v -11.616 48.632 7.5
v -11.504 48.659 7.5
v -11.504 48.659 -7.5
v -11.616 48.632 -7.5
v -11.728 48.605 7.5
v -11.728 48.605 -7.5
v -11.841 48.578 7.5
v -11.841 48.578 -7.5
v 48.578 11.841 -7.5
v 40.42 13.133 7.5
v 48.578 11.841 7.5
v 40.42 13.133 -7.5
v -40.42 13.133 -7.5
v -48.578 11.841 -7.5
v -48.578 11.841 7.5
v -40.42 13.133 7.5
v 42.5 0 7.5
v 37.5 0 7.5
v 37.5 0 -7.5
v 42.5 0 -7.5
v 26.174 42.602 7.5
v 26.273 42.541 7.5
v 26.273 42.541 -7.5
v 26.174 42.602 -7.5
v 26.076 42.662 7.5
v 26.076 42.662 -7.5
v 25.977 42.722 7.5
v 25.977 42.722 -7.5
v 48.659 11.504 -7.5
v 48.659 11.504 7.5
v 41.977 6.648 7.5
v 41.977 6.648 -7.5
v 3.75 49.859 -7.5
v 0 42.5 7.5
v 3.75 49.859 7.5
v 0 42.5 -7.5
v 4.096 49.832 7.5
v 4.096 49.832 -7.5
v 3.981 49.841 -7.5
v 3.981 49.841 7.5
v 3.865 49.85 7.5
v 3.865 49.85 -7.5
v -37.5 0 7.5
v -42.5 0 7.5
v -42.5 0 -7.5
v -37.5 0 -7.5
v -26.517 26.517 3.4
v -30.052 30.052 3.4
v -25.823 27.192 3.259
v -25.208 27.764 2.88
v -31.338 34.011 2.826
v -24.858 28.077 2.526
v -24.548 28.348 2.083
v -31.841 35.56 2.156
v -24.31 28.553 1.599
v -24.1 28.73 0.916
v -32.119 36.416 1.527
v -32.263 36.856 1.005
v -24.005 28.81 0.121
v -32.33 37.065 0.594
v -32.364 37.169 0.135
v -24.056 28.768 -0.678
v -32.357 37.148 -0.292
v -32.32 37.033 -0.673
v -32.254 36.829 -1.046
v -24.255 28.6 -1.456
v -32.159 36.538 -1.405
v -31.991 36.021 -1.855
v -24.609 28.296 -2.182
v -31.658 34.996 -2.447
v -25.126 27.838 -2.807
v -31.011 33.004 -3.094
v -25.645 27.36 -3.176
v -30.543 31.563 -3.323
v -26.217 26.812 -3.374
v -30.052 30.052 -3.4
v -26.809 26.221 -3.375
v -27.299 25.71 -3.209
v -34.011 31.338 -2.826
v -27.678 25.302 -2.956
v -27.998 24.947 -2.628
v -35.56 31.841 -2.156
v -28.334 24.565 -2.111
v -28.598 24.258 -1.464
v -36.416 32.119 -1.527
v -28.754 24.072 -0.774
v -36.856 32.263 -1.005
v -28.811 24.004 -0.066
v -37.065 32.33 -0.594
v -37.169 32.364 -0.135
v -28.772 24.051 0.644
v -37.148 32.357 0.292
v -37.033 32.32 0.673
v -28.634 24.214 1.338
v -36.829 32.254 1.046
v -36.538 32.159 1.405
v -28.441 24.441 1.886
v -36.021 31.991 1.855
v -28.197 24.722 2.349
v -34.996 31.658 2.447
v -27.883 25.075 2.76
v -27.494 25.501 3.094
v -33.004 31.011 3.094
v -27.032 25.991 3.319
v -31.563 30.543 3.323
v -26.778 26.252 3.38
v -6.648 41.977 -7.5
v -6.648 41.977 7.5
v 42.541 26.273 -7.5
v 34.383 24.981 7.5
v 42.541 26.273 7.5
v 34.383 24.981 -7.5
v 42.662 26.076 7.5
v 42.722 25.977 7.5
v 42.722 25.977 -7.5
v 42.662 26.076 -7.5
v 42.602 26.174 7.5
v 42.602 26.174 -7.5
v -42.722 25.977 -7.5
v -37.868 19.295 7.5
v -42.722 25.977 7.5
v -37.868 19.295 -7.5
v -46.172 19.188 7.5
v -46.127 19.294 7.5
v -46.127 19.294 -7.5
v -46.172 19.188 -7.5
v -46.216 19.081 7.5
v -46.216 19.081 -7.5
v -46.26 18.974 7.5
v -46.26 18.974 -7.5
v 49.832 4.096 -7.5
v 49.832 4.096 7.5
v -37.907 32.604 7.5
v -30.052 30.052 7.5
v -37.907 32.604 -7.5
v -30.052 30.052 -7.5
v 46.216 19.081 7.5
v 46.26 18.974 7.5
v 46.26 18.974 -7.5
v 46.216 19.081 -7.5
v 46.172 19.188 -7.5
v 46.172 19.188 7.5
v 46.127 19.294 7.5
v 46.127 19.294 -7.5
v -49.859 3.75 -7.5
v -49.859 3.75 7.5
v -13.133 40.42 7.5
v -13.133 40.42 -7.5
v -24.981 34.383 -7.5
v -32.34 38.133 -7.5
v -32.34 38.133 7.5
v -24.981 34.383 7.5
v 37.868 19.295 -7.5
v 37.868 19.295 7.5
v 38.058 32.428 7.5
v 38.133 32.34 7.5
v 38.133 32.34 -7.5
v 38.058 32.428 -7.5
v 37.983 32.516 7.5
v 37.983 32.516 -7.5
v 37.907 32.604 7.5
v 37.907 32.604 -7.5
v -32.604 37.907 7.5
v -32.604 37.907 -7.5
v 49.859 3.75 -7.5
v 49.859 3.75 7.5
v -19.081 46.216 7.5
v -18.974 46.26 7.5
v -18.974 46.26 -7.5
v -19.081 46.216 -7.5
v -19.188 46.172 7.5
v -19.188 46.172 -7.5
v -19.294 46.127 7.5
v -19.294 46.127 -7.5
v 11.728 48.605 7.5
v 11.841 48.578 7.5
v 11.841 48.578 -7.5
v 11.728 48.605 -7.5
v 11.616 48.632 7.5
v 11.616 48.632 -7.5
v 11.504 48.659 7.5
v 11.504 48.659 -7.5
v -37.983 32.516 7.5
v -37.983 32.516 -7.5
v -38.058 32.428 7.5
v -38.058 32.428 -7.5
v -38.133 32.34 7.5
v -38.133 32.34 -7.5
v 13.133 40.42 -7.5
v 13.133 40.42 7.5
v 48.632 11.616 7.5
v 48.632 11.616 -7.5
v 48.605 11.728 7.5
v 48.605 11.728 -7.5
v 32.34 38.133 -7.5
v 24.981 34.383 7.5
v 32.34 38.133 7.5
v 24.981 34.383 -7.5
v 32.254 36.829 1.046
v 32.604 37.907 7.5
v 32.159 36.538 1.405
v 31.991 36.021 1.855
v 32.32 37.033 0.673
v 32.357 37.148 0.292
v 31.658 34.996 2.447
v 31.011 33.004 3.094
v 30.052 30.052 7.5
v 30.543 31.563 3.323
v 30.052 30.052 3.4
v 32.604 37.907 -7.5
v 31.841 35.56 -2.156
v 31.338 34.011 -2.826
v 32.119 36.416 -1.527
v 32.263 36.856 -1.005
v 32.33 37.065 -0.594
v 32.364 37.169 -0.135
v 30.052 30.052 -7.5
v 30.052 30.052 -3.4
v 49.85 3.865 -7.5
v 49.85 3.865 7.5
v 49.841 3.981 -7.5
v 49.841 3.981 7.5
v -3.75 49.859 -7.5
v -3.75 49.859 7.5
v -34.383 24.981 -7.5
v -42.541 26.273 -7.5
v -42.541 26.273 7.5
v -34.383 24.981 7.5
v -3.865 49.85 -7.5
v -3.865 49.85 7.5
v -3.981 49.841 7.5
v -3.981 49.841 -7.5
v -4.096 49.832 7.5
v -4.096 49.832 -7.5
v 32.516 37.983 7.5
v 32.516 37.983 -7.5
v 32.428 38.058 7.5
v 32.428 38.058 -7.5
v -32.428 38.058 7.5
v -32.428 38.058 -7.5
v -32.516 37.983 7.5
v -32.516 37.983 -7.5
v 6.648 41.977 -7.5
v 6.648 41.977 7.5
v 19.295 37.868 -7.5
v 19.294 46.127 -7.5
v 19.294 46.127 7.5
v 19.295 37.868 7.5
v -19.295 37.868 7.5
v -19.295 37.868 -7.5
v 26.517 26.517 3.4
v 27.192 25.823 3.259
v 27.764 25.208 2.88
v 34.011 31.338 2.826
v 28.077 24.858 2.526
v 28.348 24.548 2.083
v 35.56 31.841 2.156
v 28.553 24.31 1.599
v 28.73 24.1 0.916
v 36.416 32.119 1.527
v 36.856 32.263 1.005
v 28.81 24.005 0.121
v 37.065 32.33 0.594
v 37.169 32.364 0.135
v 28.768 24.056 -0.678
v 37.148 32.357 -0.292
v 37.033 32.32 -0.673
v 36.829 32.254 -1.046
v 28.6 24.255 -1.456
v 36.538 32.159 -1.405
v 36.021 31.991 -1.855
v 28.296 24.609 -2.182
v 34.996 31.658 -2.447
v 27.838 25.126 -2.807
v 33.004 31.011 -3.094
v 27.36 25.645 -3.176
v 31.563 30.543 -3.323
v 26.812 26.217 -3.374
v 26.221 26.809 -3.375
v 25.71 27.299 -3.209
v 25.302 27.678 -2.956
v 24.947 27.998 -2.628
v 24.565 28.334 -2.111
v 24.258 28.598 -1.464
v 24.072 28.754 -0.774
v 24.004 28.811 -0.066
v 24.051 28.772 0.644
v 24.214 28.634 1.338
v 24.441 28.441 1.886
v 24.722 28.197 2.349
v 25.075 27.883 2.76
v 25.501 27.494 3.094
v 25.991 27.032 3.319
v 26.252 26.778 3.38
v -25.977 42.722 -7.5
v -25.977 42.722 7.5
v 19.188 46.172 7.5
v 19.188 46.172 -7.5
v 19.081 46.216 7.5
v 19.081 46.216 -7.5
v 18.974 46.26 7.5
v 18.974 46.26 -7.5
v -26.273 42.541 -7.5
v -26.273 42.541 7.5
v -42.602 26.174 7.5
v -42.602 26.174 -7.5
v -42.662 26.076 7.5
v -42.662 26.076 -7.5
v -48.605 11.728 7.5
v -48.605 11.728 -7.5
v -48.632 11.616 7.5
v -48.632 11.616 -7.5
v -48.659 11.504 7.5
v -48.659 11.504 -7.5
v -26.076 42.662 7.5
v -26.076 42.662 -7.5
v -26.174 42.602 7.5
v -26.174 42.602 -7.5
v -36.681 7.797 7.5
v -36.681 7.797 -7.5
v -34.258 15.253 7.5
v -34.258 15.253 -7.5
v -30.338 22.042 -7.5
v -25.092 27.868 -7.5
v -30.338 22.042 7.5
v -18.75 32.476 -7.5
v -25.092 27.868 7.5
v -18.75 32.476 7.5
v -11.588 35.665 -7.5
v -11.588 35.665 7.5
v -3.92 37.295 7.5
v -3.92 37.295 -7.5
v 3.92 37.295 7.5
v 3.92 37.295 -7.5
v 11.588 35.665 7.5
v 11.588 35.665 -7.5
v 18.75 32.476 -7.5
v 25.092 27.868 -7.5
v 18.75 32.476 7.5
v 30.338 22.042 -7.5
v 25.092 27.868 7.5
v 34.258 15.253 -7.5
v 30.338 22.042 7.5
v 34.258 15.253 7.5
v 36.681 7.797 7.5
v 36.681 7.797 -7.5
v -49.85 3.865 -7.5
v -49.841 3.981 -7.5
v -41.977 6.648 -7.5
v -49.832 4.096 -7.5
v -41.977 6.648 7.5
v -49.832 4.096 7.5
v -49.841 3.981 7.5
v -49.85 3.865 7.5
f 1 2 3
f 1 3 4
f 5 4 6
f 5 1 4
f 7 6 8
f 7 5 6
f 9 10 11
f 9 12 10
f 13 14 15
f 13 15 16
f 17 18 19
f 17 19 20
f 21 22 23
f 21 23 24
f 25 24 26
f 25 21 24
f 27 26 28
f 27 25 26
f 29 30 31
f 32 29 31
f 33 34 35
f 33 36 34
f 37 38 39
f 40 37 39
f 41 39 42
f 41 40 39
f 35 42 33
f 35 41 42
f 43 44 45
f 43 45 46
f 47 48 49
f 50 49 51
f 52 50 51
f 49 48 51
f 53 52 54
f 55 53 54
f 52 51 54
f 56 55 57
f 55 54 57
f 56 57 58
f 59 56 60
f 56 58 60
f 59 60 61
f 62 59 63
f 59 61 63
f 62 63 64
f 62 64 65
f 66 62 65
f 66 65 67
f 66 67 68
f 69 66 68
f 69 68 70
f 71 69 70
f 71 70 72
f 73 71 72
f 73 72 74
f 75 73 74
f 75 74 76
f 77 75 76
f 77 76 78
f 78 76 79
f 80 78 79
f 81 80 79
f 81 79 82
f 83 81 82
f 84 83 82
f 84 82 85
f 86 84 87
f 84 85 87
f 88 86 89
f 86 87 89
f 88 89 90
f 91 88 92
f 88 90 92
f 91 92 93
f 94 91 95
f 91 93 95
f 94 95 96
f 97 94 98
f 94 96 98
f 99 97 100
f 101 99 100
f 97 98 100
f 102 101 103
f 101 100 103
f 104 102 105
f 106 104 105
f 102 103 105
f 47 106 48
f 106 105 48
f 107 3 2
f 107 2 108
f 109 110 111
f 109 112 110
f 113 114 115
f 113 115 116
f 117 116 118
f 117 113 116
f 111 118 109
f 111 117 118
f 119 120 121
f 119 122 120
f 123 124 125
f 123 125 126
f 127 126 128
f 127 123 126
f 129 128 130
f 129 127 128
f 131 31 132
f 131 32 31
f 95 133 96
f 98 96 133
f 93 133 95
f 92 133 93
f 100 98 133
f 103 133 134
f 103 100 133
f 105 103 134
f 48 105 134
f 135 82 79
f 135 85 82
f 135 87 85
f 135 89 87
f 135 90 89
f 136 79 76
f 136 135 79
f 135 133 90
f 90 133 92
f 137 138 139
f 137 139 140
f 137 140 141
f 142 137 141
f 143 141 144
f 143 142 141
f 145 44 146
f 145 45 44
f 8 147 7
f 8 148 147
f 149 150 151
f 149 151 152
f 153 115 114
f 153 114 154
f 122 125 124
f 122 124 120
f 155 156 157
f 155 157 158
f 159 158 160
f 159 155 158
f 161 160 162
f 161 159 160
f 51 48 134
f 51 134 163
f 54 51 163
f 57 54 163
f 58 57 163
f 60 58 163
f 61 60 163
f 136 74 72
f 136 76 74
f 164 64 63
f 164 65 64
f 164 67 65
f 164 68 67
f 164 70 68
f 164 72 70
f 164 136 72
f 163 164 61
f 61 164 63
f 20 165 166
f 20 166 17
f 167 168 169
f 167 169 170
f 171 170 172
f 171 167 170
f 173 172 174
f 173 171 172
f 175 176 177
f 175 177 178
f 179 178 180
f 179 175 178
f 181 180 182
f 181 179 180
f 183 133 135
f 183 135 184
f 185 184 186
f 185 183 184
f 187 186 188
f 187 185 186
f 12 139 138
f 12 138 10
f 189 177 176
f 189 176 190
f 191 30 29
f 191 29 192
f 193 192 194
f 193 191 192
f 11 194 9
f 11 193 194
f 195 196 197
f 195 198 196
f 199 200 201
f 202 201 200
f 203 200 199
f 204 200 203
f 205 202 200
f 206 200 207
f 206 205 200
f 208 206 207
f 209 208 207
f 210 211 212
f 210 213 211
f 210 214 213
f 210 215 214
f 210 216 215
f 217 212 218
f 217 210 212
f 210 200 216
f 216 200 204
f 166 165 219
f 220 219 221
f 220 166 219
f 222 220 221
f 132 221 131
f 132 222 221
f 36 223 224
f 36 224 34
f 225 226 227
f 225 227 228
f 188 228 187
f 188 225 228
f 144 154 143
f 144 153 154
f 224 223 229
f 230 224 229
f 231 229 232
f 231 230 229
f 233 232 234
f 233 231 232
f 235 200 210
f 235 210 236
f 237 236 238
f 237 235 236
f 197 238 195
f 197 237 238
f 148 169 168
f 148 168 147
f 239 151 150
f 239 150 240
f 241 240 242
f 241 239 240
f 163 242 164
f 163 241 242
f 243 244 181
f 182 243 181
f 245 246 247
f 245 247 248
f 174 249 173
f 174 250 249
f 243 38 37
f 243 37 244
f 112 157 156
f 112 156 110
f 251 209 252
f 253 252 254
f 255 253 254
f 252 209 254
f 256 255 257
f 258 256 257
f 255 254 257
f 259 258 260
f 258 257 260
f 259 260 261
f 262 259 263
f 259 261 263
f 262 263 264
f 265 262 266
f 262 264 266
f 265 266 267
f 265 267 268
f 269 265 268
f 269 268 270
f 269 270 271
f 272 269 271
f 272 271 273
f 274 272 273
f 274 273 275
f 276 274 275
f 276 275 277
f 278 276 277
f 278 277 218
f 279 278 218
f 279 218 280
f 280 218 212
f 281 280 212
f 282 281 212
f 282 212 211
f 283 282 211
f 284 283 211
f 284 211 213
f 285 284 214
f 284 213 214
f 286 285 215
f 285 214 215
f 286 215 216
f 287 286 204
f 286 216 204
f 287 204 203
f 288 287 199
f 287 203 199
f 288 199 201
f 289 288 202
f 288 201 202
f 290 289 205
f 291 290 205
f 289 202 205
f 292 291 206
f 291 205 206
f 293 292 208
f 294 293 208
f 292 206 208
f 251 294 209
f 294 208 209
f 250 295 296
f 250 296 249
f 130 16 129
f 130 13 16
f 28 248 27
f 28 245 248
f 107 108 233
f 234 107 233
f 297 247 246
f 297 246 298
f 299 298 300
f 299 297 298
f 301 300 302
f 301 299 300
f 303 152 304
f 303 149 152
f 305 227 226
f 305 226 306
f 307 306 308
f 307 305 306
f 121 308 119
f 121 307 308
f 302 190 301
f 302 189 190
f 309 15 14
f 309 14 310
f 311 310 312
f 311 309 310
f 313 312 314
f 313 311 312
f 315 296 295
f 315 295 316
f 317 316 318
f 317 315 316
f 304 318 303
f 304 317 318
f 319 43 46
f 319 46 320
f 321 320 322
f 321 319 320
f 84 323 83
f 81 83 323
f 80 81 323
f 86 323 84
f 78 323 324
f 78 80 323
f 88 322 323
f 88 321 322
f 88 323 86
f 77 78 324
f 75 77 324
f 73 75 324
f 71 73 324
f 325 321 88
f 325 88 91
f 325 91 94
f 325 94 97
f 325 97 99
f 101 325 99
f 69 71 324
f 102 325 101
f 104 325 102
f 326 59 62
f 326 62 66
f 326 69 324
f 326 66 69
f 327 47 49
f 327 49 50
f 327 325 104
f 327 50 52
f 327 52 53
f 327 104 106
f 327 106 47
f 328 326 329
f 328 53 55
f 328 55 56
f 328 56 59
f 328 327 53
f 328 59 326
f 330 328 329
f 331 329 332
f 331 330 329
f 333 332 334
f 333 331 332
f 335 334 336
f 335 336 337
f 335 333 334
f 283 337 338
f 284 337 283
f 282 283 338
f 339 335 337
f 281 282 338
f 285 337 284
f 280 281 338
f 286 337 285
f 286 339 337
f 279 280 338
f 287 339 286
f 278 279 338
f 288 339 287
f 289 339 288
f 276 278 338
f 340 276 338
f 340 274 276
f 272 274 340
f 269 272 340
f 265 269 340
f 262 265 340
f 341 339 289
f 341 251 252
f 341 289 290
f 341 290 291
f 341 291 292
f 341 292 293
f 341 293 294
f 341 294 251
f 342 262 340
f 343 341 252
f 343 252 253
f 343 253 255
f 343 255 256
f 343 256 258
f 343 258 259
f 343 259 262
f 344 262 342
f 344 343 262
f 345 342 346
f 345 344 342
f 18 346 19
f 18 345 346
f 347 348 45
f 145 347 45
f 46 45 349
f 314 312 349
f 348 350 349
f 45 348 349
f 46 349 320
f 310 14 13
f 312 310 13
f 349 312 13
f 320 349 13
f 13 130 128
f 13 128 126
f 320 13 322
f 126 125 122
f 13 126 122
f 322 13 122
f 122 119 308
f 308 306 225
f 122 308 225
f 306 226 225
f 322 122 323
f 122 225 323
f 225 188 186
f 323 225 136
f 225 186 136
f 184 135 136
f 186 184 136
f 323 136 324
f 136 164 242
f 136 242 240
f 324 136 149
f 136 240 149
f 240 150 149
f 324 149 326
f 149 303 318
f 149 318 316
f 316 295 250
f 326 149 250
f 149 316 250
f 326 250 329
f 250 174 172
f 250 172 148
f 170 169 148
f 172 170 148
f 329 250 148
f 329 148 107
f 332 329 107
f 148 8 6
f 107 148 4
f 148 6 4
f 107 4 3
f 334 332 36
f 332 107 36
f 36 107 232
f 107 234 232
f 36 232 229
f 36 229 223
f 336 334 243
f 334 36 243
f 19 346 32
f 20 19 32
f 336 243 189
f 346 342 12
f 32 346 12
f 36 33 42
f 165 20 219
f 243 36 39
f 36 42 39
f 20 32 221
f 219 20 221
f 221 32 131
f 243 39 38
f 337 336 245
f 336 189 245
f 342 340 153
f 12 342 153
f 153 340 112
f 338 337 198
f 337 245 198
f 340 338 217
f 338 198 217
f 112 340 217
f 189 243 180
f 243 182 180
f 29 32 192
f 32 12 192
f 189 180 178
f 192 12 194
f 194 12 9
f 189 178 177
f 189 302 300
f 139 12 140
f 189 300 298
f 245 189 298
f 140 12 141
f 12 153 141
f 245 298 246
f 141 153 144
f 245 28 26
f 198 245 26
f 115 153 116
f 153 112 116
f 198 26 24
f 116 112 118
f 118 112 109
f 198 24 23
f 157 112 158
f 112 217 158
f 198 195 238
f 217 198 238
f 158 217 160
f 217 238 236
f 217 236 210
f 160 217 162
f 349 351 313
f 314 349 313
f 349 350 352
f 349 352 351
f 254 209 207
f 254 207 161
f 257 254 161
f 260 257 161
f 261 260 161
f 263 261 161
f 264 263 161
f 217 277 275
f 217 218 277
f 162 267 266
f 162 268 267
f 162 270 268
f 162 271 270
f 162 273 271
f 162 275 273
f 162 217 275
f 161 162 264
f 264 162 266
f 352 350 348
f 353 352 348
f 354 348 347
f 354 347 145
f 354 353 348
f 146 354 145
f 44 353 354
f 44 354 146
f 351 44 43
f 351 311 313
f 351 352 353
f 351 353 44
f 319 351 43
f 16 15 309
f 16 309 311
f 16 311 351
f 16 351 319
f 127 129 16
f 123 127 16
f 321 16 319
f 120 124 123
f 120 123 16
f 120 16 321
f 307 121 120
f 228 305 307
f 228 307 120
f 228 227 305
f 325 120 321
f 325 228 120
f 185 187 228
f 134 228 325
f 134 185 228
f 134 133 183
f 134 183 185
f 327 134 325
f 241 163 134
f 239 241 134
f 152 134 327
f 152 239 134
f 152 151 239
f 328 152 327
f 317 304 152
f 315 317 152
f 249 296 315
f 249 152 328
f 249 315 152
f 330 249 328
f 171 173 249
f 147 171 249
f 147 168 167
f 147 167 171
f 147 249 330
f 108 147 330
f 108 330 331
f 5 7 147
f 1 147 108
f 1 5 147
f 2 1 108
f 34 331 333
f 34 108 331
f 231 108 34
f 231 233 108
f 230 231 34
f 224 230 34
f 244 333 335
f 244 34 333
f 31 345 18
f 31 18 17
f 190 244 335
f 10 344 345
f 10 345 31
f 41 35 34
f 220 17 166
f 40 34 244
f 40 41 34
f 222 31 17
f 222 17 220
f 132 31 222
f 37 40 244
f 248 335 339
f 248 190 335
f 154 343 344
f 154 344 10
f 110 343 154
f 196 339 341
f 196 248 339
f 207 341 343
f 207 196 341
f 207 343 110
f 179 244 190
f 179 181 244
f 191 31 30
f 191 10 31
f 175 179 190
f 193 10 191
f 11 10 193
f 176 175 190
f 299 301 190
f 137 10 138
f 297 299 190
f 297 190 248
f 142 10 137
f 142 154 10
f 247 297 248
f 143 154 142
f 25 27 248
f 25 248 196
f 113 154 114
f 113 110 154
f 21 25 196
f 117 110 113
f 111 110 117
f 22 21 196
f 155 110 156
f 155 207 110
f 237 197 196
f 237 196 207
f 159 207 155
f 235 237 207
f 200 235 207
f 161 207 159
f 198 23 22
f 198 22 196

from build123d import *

# Parameters (mm, degrees)
BOSS_EXTRUDE1_DEPTH    = 7.5
CUT_EXTRUDE1_DEPTH     = 7.5
M8X1_25_TAPPED_HOLE4_D = 6.8
M8X1_25_TAPPED_HOLE5_D = 6.8


with BuildPart() as part:
    # Sketch1 → Boss-Extrude1 (new body, symmetric)
    with BuildSketch(Plane.XY):
        with BuildLine():
            Line((-50, 0), (-37.5, 0))
            ThreePointArc((-37.5, 0), (0, 37.5), (37.5, 0))
            Line((37.5, 0), (50, 0))
            ThreePointArc((50, 0), (0, 50), (-50, 0))
        make_face()
    extrude(amount=BOSS_EXTRUDE1_DEPTH, both=True)

    # Sketch2 → Cut-Extrude1 (cut, symmetric)
    with BuildSketch(Plane.XY):
        with BuildLine():
            Line((-3.75, 49.859176688), (0, 42.5))
            Line((0, 42.5), (3.75, 49.859176688))
            ThreePointArc((3.75, 49.859176688), (0, 50), (-3.75, 49.859176688))
        make_face()
        with BuildLine():
            Line((4.095862355, 49.83195673), (6.648464764, 41.976754475))
            Line((6.648464764, 41.976754475), (11.50352491, 48.658698242))
            ThreePointArc((11.50352491, 48.658698242), (7.821723252, 49.38441703), (4.095862355, 49.83195673))
        make_face()
        with BuildLine():
            Line((11.840870986, 48.577708615), (13.133222261, 40.419901943))
            Line((13.133222261, 40.419901943), (18.973794858, 46.260081157))
            ThreePointArc((18.973794858, 46.260081157), (15.450849719, 47.552825815), (11.840870986, 48.577708615))
        make_face()
        with BuildLine():
            Line((19.294318075, 46.127316094), (19.294596239, 37.867777278))
            Line((19.294596239, 37.867777278), (25.976867007, 42.722387346))
            ThreePointArc((25.976867007, 42.722387346), (22.699524987, 44.550326209), (19.294318075, 46.127316094))
        make_face()
        with BuildLine():
            Line((26.27267502, 42.541115962), (24.980873222, 34.383222261))
            Line((24.980873222, 34.383222261), (32.340302478, 38.13272657))
            ThreePointArc((32.340302478, 38.13272657), (29.389262615, 40.450849719), (26.27267502, 42.541115962))
        make_face()
        with BuildLine():
            Line((32.604111511, 37.90741237), (30.0520382, 30.0520382))
            Line((30.0520382, 30.0520382), (37.90741237, 32.604111511))
            ThreePointArc((37.90741237, 32.604111511), (35.355339059, 35.355339059), (32.604111511, 37.90741237))
        make_face()
        with BuildLine():
            Line((38.13272657, 32.340302478), (34.383222261, 24.980873222))
            Line((34.383222261, 24.980873222), (42.541115962, 26.27267502))
            ThreePointArc((42.541115962, 26.27267502), (40.450849719, 29.389262615), (38.13272657, 32.340302478))
        make_face()
        with BuildLine():
            Line((42.722387346, 25.976867007), (37.867777278, 19.294596239))
            Line((37.867777278, 19.294596239), (46.127316094, 19.294318075))
            ThreePointArc((46.127316094, 19.294318075), (44.550326209, 22.699524987), (42.722387346, 25.976867007))
        make_face()
        with BuildLine():
            Line((46.260081157, 18.973794858), (40.419901943, 13.133222261))
            Line((40.419901943, 13.133222261), (48.577708615, 11.840870986))
            ThreePointArc((48.577708615, 11.840870986), (47.552825815, 15.450849719), (46.260081157, 18.973794858))
        make_face()
        with BuildLine():
            Line((48.658698242, 11.50352491), (41.976754475, 6.648464764))
            Line((41.976754475, 6.648464764), (49.83195673, 4.095862355))
            ThreePointArc((49.83195673, 4.095862355), (49.38441703, 7.821723252), (48.658698242, 11.50352491))
        make_face()
        with BuildLine():
            Line((49.859176688, 3.75), (42.5, 0))
            Line((42.5, 0), (49.859176688, -3.75))
            ThreePointArc((49.859176688, -3.75), (50, 0), (49.859176688, 3.75))
        make_face()
        with BuildLine():
            Line((-49.859176688, -3.75), (-42.5, 0))
            Line((-42.5, 0), (-49.859176688, 3.75))
            ThreePointArc((-49.859176688, 3.75), (-50, 0), (-49.859176688, -3.75))
        make_face()
        with BuildLine():
            Line((-49.83195673, 4.095862355), (-41.976754475, 6.648464764))
            Line((-41.976754475, 6.648464764), (-48.658698242, 11.50352491))
            ThreePointArc((-48.658698242, 11.50352491), (-49.38441703, 7.821723252), (-49.83195673, 4.095862355))
        make_face()
        with BuildLine():
            Line((-48.577708615, 11.840870986), (-40.419901943, 13.133222261))
            Line((-40.419901943, 13.133222261), (-46.260081157, 18.973794858))
            ThreePointArc((-46.260081157, 18.973794858), (-47.552825815, 15.450849719), (-48.577708615, 11.840870986))
        make_face()
        with BuildLine():
            Line((-46.127316094, 19.294318075), (-37.867777278, 19.294596239))
            Line((-37.867777278, 19.294596239), (-42.722387346, 25.976867007))
            ThreePointArc((-42.722387346, 25.976867007), (-44.550326209, 22.699524987), (-46.127316094, 19.294318075))
        make_face()
        with BuildLine():
            Line((-42.541115962, 26.27267502), (-34.383222261, 24.980873222))
            Line((-34.383222261, 24.980873222), (-38.13272657, 32.340302478))
            ThreePointArc((-38.13272657, 32.340302478), (-40.450849719, 29.389262615), (-42.541115962, 26.27267502))
        make_face()
        with BuildLine():
            Line((-37.90741237, 32.604111511), (-30.0520382, 30.0520382))
            Line((-30.0520382, 30.0520382), (-32.604111511, 37.90741237))
            ThreePointArc((-32.604111511, 37.90741237), (-35.355339059, 35.355339059), (-37.90741237, 32.604111511))
        make_face()
        with BuildLine():
            Line((-32.340302478, 38.13272657), (-24.980873222, 34.383222261))
            Line((-24.980873222, 34.383222261), (-26.27267502, 42.541115962))
            ThreePointArc((-26.27267502, 42.541115962), (-29.389262615, 40.450849719), (-32.340302478, 38.13272657))
        make_face()
        with BuildLine():
            Line((-25.976867007, 42.722387346), (-19.294596239, 37.867777278))
            Line((-19.294596239, 37.867777278), (-19.294318075, 46.127316094))
            ThreePointArc((-19.294318075, 46.127316094), (-22.699524987, 44.550326209), (-25.976867007, 42.722387346))
        make_face()
        with BuildLine():
            Line((-18.973794858, 46.260081157), (-13.133222261, 40.419901943))
            Line((-13.133222261, 40.419901943), (-11.840870986, 48.577708615))
            ThreePointArc((-11.840870986, 48.577708615), (-15.450849719, 47.552825815), (-18.973794858, 46.260081157))
        make_face()
        with BuildLine():
            Line((-11.50352491, 48.658698242), (-6.648464764, 41.976754475))
            Line((-6.648464764, 41.976754475), (-4.095862355, 49.83195673))
            ThreePointArc((-4.095862355, 49.83195673), (-7.821723252, 49.38441703), (-11.50352491, 48.658698242))
        make_face()
    extrude(amount=CUT_EXTRUDE1_DEPTH, both=True, mode=Mode.SUBTRACT)

    # M8x1.25 Tapped Hole4 (through all)
    with Locations(Plane(origin=(-19.445436483, 19.445436483, 0), x_dir=(0, 0, -1), z_dir=(0.707106781, -0.707106781, 0))):
        with Locations((0, 0)):
            Hole(M8X1_25_TAPPED_HOLE4_D / 2)

    # M8x1.25 Tapped Hole5 (through all)
    with Locations(Plane(origin=(19.445436483, 19.445436483, 0), x_dir=(0, 0, -1), z_dir=(-0.707106781, -0.707106781, 0))):
        with Locations((0, 0)):
            Hole(M8X1_25_TAPPED_HOLE5_D / 2)


solid = part.part
